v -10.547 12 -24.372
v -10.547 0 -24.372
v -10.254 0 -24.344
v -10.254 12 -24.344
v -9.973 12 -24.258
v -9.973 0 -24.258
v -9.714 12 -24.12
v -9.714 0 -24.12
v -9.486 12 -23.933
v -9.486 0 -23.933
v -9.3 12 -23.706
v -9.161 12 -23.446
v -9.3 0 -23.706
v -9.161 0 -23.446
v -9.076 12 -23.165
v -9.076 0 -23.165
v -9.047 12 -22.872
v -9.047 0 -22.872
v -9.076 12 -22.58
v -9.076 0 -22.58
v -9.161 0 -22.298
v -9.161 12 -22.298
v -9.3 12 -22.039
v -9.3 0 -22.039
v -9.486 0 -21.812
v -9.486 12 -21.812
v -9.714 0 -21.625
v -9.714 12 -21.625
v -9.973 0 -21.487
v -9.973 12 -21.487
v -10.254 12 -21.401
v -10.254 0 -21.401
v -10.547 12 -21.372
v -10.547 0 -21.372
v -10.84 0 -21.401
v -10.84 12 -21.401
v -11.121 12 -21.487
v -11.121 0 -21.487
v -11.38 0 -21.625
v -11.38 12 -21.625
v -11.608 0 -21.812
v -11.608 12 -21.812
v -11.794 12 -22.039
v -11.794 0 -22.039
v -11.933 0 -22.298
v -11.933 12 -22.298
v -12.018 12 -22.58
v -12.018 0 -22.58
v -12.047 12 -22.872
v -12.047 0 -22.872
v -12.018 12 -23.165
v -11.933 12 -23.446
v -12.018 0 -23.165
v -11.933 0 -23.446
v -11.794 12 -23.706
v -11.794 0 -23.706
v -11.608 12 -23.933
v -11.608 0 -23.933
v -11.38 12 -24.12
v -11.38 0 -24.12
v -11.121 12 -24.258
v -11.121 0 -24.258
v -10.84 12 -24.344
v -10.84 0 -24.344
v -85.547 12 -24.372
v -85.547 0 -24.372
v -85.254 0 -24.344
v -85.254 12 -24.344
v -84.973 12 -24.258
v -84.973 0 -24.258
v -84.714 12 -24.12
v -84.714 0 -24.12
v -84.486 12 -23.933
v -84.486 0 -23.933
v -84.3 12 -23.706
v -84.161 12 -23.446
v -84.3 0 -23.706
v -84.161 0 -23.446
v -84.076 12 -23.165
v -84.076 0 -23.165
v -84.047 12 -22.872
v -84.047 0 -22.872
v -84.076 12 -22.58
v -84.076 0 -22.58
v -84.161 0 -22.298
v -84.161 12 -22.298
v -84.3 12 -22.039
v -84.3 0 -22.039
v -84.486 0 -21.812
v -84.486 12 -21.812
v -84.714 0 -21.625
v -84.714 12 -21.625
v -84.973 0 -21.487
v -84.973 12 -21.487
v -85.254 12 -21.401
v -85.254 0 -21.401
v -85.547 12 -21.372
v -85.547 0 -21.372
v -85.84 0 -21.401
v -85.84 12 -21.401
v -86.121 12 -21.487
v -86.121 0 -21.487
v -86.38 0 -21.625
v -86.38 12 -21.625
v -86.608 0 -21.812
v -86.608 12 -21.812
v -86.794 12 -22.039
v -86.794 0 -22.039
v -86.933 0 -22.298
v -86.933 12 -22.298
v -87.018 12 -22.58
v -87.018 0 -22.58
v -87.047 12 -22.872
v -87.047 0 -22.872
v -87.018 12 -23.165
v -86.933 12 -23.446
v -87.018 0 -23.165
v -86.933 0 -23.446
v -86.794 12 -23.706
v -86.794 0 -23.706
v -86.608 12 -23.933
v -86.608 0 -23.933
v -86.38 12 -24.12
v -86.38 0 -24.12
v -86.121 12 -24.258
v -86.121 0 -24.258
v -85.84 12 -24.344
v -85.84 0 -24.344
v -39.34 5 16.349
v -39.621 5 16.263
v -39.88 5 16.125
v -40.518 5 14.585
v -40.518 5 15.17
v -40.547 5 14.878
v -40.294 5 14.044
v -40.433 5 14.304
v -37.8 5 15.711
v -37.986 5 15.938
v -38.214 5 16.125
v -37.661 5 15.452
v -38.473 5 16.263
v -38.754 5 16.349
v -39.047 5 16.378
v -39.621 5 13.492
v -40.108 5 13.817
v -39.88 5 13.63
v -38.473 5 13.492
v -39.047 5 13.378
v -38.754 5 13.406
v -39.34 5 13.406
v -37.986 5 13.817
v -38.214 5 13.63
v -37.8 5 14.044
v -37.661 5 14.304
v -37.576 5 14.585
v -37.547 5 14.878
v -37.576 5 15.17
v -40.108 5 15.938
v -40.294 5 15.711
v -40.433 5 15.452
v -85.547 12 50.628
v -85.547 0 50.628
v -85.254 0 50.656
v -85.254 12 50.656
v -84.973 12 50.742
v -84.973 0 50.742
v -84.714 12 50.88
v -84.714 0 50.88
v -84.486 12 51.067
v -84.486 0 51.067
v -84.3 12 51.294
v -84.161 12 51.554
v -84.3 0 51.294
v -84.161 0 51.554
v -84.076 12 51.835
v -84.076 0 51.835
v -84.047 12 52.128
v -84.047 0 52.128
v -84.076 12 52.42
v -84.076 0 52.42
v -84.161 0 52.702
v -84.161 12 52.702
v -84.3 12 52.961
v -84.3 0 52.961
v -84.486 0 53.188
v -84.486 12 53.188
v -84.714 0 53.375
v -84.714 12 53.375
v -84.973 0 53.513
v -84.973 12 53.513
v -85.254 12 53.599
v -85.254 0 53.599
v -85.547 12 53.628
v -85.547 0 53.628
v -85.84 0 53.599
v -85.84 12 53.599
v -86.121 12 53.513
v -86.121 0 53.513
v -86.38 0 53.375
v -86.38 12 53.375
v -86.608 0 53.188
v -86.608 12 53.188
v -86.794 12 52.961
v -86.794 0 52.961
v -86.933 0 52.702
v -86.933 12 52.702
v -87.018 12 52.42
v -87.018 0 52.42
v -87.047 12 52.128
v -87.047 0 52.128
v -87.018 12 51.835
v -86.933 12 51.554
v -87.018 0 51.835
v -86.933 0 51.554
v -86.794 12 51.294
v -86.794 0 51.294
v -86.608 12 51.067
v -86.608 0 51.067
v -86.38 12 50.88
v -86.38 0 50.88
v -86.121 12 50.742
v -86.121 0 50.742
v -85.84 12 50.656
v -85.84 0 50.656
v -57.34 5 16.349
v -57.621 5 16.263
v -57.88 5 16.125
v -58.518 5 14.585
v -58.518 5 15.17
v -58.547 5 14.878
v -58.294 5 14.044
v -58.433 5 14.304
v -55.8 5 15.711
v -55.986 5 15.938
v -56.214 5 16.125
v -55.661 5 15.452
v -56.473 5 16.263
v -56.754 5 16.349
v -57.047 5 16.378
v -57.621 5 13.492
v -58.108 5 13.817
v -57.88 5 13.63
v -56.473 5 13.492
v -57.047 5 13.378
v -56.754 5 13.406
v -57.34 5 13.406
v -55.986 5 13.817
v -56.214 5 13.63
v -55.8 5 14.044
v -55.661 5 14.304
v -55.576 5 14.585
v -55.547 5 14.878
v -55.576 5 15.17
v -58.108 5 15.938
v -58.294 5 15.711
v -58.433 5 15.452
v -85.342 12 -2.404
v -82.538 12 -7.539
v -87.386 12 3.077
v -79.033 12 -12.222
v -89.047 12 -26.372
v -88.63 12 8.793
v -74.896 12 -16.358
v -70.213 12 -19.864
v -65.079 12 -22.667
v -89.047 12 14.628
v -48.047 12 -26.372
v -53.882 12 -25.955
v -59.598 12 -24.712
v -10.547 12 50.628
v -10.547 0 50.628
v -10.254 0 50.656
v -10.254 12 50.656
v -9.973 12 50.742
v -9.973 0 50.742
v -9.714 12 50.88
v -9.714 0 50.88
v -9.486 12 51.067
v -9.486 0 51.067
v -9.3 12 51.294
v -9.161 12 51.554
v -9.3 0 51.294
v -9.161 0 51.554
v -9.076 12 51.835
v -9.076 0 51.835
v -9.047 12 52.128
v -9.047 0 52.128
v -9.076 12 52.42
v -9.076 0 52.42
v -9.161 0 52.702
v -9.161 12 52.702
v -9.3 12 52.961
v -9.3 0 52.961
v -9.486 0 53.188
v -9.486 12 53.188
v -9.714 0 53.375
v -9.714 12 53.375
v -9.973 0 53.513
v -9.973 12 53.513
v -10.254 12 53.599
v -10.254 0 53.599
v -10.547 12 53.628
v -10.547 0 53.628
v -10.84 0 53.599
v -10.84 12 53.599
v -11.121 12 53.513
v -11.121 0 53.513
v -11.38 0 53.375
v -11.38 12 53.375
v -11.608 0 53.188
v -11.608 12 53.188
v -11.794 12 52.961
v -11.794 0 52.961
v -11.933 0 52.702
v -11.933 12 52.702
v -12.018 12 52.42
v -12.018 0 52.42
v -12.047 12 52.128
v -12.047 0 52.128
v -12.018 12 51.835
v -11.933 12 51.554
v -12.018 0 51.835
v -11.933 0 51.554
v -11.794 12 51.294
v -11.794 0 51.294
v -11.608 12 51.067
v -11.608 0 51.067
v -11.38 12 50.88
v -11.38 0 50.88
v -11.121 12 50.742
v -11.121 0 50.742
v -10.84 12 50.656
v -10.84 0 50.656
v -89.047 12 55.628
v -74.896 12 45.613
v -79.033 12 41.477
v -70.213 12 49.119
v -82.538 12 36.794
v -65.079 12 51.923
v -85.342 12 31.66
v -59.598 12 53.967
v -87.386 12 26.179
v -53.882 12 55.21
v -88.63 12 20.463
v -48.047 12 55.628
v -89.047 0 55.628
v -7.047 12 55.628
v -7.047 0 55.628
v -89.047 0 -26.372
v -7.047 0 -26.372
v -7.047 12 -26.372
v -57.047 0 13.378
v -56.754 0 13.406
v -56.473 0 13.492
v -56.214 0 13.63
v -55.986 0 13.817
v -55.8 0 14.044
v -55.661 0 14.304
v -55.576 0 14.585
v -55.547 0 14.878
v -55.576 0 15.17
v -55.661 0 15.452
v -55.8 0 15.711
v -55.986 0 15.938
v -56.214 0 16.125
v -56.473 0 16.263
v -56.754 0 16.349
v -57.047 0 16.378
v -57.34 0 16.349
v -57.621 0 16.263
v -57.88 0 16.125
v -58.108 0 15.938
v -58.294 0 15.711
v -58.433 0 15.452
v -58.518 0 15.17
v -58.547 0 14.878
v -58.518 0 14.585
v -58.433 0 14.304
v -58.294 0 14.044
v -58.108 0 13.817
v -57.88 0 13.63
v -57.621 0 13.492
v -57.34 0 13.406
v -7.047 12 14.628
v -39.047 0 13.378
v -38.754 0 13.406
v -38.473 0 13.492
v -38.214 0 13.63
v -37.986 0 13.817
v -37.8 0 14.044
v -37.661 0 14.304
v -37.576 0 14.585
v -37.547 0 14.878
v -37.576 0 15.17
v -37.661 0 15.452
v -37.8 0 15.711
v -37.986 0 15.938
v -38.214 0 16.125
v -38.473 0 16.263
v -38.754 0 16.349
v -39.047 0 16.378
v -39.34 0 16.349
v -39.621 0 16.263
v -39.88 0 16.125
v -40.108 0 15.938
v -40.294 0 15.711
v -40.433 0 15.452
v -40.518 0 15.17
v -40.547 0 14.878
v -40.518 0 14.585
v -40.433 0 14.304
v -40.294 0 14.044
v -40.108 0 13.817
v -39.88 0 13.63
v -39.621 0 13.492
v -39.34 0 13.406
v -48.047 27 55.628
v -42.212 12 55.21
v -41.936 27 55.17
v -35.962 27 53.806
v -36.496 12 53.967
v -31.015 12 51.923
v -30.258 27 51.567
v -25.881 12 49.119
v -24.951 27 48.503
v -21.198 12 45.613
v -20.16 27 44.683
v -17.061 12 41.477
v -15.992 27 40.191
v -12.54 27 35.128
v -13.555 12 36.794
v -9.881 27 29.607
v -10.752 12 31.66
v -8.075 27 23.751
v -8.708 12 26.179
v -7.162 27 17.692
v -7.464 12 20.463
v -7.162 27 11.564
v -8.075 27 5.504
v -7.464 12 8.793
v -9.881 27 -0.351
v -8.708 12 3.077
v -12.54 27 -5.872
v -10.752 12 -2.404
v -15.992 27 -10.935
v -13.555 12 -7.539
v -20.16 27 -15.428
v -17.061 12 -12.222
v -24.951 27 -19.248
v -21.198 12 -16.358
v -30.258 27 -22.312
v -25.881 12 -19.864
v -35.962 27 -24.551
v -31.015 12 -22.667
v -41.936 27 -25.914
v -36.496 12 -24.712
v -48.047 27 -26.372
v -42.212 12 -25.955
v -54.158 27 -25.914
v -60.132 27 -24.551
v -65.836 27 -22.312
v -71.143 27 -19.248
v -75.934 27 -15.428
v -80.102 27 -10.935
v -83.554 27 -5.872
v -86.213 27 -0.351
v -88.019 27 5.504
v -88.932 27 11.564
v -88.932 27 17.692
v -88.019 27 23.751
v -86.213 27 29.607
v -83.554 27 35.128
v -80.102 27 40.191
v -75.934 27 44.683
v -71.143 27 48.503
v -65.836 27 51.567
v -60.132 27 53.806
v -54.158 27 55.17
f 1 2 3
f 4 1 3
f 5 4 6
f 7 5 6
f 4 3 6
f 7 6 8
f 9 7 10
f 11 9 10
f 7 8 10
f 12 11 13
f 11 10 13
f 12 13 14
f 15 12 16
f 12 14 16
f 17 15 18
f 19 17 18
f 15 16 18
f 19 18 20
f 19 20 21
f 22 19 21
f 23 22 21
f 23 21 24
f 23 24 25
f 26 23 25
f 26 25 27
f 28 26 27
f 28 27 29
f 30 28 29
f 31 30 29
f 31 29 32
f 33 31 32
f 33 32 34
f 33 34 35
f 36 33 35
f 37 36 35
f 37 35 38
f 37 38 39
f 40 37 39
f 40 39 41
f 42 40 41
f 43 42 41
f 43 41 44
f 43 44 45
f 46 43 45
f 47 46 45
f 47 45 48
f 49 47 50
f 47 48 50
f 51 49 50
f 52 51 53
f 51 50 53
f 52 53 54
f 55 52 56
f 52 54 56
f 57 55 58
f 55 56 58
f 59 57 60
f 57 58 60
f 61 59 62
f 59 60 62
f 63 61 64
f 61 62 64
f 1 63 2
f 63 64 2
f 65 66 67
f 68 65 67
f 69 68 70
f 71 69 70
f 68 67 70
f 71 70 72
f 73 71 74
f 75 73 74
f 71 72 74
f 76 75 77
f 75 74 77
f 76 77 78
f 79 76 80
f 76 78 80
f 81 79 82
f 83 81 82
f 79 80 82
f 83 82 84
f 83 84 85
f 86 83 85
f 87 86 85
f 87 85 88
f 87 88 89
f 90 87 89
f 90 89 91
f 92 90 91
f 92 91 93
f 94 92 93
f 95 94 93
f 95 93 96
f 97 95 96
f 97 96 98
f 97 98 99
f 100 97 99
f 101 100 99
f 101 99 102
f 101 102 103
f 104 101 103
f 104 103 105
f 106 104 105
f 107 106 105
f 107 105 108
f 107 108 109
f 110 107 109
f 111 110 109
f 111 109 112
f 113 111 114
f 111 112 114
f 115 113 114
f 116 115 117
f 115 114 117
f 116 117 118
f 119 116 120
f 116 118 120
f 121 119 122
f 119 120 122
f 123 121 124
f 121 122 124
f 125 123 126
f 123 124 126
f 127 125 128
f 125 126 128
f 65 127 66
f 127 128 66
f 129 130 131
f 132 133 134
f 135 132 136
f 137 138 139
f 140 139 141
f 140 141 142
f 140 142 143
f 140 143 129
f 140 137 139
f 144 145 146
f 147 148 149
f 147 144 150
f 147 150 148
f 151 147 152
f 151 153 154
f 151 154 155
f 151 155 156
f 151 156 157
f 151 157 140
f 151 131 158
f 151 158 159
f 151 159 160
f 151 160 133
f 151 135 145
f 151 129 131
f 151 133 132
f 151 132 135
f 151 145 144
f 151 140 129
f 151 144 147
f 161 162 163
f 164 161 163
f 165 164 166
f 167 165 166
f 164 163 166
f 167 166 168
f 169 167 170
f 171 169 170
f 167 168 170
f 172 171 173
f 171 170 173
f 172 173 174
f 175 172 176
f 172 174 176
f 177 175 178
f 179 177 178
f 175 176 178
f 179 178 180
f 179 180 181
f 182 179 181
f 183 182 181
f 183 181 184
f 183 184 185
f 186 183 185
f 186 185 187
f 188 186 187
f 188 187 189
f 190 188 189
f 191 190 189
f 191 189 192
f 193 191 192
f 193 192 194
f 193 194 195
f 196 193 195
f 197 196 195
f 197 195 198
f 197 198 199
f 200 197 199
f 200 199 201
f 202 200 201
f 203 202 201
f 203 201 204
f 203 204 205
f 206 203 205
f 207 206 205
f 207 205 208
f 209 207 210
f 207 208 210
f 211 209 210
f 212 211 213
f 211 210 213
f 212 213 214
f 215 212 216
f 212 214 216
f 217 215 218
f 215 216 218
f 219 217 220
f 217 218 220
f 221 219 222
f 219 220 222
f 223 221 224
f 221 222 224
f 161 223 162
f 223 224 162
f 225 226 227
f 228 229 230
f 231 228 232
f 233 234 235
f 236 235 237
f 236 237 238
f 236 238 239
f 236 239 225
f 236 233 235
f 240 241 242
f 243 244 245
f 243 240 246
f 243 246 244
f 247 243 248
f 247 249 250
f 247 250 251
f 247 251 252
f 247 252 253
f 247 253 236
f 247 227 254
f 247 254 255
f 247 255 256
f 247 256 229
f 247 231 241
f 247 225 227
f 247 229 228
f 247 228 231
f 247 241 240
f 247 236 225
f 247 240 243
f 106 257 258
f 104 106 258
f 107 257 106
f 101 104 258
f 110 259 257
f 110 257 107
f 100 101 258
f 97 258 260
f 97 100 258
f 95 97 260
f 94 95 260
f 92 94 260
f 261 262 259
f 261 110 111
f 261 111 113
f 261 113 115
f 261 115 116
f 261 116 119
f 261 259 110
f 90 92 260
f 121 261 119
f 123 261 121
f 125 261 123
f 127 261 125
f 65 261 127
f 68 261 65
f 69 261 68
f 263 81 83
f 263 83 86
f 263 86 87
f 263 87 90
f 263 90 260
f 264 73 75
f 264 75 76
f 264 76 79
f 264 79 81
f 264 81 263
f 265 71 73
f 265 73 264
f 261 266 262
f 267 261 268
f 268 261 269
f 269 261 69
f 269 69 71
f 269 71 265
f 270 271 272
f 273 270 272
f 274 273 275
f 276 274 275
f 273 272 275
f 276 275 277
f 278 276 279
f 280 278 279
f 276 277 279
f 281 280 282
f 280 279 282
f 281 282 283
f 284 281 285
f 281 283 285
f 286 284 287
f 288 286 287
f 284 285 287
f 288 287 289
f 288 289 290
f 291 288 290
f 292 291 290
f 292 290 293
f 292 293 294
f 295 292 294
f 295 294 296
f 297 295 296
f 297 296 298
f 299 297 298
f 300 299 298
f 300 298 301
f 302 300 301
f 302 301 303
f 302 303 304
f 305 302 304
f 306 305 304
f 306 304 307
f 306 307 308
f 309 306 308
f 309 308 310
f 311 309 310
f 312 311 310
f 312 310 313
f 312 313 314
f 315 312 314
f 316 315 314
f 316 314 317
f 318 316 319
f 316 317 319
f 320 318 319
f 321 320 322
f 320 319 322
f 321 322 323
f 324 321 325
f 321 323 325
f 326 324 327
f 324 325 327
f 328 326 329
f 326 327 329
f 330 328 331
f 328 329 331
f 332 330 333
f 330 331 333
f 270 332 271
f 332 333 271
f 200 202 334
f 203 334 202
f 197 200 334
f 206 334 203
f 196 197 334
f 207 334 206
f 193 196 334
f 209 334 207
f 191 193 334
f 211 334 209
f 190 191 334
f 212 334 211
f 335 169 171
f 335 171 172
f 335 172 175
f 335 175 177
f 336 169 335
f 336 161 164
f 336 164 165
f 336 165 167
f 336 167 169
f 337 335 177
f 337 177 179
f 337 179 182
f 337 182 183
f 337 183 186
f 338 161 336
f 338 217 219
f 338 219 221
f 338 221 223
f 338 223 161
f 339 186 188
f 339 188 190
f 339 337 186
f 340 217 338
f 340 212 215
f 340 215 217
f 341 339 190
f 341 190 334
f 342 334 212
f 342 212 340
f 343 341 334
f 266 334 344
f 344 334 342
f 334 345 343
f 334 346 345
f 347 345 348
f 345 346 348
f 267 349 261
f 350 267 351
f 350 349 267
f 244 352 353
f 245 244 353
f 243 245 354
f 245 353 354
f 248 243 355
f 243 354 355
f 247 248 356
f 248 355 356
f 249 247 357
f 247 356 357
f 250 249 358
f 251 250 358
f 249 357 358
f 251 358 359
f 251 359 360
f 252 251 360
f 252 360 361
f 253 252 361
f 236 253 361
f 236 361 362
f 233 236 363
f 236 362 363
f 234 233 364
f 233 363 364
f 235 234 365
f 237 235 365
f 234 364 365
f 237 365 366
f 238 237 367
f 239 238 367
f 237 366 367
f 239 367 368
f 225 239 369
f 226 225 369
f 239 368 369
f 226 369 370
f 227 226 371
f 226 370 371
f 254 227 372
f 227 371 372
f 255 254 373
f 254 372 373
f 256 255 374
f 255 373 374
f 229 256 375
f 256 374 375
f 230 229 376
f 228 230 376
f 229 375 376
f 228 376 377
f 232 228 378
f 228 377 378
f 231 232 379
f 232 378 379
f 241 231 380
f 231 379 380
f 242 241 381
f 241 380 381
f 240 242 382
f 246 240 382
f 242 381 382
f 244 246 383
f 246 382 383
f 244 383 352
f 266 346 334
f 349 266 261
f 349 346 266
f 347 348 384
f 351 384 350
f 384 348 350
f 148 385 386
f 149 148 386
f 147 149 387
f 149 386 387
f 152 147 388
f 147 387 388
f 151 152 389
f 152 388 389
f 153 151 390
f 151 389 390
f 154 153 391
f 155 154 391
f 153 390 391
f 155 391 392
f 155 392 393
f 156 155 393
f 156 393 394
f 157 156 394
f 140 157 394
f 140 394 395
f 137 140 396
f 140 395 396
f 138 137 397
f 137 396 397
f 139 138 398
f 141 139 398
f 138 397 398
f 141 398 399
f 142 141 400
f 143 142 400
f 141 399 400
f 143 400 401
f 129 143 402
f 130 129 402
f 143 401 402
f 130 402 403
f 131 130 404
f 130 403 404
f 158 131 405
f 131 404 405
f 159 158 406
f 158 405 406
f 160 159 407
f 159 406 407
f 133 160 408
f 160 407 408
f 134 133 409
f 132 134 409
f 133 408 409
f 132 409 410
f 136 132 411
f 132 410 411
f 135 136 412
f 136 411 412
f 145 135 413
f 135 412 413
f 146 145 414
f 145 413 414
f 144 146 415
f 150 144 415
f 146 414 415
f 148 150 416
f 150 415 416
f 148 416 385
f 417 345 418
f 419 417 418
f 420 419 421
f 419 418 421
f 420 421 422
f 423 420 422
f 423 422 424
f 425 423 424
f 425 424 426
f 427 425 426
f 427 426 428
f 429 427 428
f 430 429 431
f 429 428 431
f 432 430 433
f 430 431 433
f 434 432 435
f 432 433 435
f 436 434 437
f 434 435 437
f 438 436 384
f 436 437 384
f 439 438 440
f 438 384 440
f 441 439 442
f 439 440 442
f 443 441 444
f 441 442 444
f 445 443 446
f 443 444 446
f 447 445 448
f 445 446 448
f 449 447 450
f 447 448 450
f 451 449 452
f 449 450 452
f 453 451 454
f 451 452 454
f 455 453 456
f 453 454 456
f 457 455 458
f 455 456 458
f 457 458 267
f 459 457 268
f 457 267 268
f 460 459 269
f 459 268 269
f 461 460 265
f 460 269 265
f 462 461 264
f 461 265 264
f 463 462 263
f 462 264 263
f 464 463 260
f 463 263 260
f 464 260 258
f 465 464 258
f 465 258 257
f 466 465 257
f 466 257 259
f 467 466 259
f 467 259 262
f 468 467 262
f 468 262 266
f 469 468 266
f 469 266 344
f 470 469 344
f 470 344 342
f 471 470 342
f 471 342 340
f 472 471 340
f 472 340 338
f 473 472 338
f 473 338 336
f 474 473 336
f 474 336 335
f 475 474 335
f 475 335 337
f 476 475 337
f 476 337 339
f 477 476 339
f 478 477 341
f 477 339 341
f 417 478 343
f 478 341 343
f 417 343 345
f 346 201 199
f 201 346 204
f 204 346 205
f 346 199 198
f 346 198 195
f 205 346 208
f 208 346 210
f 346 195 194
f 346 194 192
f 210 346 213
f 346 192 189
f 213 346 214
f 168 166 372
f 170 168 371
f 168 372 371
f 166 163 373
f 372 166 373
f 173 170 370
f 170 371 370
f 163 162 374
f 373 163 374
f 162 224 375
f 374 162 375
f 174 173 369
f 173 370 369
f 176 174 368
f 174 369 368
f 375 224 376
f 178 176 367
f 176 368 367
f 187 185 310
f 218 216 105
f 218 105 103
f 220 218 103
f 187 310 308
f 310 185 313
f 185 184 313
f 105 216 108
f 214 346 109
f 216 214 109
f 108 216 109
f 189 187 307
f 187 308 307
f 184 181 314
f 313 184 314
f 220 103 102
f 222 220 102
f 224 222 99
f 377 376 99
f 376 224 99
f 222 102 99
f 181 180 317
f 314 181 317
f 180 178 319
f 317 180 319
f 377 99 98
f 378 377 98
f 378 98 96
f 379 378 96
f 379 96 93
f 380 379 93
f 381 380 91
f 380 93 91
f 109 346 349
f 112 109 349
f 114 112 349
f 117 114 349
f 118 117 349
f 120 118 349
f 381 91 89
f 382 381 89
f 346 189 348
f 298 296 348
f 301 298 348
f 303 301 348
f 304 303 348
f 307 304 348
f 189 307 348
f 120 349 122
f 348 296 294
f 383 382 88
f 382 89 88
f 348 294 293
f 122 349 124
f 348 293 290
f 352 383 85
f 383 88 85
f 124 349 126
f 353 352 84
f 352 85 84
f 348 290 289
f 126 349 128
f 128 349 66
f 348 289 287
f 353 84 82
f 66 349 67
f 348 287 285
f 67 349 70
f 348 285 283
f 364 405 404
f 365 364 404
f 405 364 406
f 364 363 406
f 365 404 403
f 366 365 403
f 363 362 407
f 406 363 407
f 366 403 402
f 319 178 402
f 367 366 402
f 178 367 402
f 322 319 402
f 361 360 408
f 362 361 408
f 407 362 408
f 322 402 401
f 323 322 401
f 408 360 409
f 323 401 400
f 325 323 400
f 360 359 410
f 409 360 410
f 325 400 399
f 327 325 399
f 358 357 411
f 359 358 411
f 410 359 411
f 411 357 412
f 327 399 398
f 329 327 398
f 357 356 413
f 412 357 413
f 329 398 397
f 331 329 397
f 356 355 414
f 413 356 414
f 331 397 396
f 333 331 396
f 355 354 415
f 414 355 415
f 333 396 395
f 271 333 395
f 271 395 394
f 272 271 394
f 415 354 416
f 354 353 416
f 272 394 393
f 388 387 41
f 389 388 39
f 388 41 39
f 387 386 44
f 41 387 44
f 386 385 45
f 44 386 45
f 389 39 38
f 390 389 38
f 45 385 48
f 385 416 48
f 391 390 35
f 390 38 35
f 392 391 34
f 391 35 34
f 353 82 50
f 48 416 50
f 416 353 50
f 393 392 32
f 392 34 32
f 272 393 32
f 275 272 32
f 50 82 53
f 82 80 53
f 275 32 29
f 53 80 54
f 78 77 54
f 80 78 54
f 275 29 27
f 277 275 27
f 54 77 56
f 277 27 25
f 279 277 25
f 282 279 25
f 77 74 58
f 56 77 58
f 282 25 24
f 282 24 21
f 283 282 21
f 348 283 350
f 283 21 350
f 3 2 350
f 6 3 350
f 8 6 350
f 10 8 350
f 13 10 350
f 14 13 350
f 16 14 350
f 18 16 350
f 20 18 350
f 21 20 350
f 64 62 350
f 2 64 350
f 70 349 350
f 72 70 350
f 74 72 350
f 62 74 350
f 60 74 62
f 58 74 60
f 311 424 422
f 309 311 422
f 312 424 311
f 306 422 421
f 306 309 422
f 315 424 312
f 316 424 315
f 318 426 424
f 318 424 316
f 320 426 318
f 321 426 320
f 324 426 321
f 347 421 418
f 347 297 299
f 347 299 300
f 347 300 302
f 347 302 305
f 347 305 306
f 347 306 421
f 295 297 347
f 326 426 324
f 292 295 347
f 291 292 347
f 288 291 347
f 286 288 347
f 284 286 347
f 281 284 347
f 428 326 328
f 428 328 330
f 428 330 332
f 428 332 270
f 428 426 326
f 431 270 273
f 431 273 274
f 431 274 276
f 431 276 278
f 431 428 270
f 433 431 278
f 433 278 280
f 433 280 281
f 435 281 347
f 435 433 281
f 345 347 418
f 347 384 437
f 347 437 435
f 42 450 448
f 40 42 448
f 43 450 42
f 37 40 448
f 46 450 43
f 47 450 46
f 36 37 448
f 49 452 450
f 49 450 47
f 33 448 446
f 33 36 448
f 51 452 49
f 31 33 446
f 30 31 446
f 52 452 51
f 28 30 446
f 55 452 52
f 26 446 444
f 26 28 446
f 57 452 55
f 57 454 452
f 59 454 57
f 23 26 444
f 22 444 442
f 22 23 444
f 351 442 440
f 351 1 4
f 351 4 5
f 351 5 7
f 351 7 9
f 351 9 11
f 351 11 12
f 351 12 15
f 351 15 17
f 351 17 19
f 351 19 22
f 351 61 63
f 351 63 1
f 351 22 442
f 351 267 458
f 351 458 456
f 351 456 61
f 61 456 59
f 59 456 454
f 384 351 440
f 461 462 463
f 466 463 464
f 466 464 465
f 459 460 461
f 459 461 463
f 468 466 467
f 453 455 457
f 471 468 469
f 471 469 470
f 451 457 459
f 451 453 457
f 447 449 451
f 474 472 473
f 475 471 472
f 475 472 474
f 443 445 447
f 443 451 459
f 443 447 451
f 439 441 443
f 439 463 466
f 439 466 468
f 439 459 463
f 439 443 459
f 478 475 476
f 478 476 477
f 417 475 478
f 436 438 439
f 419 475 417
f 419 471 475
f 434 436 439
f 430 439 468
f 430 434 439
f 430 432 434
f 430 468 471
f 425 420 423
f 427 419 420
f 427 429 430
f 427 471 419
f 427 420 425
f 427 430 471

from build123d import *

# Parameters (mm, degrees)
SKETCH1_W           = 82
SKETCH1_H           = 82
BOSS_EXTRUDE1_DEPTH = 12
SKETCH2_R           = 1.5
CUT_EXTRUDE1_DEPTH  = 106.677700072
SKETCH3_R           = 41
BOSS_EXTRUDE2_DEPTH = 15
SKETCH4_R           = 1.5
CUT_EXTRUDE2_DEPTH  = 5


with BuildPart() as part:
    # Sketch1 → Boss-Extrude1 (new body)
    with BuildSketch(Plane(origin=(0, 0, 0), x_dir=(1, 0, 0), z_dir=(0, 1, 0))):
        with Locations((-48.046875, -14.627604167)):
            Rectangle(SKETCH1_W, SKETCH1_H)
    extrude(amount=BOSS_EXTRUDE1_DEPTH)

    # Sketch2 → Cut-Extrude1 (cut, through all)
    with BuildSketch(Plane.XZ):
        with Locations(Location((-85.546875, 52.127604167, 0), (0, 0, 270))):
            Circle(SKETCH2_R)
        with Locations(Location((-10.546875, 52.127604167, 0), (0, 0, 270))):
            Circle(SKETCH2_R)
        with Locations(Location((-85.546875, -22.872395833, 0), (0, 0, 270))):
            Circle(SKETCH2_R)
        with Locations(Location((-10.546875, -22.872395833, 0), (0, 0, 270))):
            Circle(SKETCH2_R)
    extrude(amount=-CUT_EXTRUDE1_DEPTH, mode=Mode.SUBTRACT)

    # Sketch3 → Boss-Extrude2 (add)
    with BuildSketch(Plane(origin=(0, 12, 0), x_dir=(1, 0, 0), z_dir=(0, 1, 0))):
        with Locations(Location((-48.046875, -14.627604167, 0), (0, 0, 270))):
            Circle(SKETCH3_R)
    extrude(amount=BOSS_EXTRUDE2_DEPTH)

    # Sketch4 → Cut-Extrude2 (cut)
    with BuildSketch(Plane.XZ):
        with Locations(Location((-57.046875, 14.877604167, 0), (0, 0, 270))):
            Circle(SKETCH4_R)
        with Locations(Location((-39.046875, 14.877604167, 0), (0, 0, 270))):
            Circle(SKETCH4_R)
    extrude(amount=-CUT_EXTRUDE2_DEPTH, mode=Mode.SUBTRACT)


solid = part.part
